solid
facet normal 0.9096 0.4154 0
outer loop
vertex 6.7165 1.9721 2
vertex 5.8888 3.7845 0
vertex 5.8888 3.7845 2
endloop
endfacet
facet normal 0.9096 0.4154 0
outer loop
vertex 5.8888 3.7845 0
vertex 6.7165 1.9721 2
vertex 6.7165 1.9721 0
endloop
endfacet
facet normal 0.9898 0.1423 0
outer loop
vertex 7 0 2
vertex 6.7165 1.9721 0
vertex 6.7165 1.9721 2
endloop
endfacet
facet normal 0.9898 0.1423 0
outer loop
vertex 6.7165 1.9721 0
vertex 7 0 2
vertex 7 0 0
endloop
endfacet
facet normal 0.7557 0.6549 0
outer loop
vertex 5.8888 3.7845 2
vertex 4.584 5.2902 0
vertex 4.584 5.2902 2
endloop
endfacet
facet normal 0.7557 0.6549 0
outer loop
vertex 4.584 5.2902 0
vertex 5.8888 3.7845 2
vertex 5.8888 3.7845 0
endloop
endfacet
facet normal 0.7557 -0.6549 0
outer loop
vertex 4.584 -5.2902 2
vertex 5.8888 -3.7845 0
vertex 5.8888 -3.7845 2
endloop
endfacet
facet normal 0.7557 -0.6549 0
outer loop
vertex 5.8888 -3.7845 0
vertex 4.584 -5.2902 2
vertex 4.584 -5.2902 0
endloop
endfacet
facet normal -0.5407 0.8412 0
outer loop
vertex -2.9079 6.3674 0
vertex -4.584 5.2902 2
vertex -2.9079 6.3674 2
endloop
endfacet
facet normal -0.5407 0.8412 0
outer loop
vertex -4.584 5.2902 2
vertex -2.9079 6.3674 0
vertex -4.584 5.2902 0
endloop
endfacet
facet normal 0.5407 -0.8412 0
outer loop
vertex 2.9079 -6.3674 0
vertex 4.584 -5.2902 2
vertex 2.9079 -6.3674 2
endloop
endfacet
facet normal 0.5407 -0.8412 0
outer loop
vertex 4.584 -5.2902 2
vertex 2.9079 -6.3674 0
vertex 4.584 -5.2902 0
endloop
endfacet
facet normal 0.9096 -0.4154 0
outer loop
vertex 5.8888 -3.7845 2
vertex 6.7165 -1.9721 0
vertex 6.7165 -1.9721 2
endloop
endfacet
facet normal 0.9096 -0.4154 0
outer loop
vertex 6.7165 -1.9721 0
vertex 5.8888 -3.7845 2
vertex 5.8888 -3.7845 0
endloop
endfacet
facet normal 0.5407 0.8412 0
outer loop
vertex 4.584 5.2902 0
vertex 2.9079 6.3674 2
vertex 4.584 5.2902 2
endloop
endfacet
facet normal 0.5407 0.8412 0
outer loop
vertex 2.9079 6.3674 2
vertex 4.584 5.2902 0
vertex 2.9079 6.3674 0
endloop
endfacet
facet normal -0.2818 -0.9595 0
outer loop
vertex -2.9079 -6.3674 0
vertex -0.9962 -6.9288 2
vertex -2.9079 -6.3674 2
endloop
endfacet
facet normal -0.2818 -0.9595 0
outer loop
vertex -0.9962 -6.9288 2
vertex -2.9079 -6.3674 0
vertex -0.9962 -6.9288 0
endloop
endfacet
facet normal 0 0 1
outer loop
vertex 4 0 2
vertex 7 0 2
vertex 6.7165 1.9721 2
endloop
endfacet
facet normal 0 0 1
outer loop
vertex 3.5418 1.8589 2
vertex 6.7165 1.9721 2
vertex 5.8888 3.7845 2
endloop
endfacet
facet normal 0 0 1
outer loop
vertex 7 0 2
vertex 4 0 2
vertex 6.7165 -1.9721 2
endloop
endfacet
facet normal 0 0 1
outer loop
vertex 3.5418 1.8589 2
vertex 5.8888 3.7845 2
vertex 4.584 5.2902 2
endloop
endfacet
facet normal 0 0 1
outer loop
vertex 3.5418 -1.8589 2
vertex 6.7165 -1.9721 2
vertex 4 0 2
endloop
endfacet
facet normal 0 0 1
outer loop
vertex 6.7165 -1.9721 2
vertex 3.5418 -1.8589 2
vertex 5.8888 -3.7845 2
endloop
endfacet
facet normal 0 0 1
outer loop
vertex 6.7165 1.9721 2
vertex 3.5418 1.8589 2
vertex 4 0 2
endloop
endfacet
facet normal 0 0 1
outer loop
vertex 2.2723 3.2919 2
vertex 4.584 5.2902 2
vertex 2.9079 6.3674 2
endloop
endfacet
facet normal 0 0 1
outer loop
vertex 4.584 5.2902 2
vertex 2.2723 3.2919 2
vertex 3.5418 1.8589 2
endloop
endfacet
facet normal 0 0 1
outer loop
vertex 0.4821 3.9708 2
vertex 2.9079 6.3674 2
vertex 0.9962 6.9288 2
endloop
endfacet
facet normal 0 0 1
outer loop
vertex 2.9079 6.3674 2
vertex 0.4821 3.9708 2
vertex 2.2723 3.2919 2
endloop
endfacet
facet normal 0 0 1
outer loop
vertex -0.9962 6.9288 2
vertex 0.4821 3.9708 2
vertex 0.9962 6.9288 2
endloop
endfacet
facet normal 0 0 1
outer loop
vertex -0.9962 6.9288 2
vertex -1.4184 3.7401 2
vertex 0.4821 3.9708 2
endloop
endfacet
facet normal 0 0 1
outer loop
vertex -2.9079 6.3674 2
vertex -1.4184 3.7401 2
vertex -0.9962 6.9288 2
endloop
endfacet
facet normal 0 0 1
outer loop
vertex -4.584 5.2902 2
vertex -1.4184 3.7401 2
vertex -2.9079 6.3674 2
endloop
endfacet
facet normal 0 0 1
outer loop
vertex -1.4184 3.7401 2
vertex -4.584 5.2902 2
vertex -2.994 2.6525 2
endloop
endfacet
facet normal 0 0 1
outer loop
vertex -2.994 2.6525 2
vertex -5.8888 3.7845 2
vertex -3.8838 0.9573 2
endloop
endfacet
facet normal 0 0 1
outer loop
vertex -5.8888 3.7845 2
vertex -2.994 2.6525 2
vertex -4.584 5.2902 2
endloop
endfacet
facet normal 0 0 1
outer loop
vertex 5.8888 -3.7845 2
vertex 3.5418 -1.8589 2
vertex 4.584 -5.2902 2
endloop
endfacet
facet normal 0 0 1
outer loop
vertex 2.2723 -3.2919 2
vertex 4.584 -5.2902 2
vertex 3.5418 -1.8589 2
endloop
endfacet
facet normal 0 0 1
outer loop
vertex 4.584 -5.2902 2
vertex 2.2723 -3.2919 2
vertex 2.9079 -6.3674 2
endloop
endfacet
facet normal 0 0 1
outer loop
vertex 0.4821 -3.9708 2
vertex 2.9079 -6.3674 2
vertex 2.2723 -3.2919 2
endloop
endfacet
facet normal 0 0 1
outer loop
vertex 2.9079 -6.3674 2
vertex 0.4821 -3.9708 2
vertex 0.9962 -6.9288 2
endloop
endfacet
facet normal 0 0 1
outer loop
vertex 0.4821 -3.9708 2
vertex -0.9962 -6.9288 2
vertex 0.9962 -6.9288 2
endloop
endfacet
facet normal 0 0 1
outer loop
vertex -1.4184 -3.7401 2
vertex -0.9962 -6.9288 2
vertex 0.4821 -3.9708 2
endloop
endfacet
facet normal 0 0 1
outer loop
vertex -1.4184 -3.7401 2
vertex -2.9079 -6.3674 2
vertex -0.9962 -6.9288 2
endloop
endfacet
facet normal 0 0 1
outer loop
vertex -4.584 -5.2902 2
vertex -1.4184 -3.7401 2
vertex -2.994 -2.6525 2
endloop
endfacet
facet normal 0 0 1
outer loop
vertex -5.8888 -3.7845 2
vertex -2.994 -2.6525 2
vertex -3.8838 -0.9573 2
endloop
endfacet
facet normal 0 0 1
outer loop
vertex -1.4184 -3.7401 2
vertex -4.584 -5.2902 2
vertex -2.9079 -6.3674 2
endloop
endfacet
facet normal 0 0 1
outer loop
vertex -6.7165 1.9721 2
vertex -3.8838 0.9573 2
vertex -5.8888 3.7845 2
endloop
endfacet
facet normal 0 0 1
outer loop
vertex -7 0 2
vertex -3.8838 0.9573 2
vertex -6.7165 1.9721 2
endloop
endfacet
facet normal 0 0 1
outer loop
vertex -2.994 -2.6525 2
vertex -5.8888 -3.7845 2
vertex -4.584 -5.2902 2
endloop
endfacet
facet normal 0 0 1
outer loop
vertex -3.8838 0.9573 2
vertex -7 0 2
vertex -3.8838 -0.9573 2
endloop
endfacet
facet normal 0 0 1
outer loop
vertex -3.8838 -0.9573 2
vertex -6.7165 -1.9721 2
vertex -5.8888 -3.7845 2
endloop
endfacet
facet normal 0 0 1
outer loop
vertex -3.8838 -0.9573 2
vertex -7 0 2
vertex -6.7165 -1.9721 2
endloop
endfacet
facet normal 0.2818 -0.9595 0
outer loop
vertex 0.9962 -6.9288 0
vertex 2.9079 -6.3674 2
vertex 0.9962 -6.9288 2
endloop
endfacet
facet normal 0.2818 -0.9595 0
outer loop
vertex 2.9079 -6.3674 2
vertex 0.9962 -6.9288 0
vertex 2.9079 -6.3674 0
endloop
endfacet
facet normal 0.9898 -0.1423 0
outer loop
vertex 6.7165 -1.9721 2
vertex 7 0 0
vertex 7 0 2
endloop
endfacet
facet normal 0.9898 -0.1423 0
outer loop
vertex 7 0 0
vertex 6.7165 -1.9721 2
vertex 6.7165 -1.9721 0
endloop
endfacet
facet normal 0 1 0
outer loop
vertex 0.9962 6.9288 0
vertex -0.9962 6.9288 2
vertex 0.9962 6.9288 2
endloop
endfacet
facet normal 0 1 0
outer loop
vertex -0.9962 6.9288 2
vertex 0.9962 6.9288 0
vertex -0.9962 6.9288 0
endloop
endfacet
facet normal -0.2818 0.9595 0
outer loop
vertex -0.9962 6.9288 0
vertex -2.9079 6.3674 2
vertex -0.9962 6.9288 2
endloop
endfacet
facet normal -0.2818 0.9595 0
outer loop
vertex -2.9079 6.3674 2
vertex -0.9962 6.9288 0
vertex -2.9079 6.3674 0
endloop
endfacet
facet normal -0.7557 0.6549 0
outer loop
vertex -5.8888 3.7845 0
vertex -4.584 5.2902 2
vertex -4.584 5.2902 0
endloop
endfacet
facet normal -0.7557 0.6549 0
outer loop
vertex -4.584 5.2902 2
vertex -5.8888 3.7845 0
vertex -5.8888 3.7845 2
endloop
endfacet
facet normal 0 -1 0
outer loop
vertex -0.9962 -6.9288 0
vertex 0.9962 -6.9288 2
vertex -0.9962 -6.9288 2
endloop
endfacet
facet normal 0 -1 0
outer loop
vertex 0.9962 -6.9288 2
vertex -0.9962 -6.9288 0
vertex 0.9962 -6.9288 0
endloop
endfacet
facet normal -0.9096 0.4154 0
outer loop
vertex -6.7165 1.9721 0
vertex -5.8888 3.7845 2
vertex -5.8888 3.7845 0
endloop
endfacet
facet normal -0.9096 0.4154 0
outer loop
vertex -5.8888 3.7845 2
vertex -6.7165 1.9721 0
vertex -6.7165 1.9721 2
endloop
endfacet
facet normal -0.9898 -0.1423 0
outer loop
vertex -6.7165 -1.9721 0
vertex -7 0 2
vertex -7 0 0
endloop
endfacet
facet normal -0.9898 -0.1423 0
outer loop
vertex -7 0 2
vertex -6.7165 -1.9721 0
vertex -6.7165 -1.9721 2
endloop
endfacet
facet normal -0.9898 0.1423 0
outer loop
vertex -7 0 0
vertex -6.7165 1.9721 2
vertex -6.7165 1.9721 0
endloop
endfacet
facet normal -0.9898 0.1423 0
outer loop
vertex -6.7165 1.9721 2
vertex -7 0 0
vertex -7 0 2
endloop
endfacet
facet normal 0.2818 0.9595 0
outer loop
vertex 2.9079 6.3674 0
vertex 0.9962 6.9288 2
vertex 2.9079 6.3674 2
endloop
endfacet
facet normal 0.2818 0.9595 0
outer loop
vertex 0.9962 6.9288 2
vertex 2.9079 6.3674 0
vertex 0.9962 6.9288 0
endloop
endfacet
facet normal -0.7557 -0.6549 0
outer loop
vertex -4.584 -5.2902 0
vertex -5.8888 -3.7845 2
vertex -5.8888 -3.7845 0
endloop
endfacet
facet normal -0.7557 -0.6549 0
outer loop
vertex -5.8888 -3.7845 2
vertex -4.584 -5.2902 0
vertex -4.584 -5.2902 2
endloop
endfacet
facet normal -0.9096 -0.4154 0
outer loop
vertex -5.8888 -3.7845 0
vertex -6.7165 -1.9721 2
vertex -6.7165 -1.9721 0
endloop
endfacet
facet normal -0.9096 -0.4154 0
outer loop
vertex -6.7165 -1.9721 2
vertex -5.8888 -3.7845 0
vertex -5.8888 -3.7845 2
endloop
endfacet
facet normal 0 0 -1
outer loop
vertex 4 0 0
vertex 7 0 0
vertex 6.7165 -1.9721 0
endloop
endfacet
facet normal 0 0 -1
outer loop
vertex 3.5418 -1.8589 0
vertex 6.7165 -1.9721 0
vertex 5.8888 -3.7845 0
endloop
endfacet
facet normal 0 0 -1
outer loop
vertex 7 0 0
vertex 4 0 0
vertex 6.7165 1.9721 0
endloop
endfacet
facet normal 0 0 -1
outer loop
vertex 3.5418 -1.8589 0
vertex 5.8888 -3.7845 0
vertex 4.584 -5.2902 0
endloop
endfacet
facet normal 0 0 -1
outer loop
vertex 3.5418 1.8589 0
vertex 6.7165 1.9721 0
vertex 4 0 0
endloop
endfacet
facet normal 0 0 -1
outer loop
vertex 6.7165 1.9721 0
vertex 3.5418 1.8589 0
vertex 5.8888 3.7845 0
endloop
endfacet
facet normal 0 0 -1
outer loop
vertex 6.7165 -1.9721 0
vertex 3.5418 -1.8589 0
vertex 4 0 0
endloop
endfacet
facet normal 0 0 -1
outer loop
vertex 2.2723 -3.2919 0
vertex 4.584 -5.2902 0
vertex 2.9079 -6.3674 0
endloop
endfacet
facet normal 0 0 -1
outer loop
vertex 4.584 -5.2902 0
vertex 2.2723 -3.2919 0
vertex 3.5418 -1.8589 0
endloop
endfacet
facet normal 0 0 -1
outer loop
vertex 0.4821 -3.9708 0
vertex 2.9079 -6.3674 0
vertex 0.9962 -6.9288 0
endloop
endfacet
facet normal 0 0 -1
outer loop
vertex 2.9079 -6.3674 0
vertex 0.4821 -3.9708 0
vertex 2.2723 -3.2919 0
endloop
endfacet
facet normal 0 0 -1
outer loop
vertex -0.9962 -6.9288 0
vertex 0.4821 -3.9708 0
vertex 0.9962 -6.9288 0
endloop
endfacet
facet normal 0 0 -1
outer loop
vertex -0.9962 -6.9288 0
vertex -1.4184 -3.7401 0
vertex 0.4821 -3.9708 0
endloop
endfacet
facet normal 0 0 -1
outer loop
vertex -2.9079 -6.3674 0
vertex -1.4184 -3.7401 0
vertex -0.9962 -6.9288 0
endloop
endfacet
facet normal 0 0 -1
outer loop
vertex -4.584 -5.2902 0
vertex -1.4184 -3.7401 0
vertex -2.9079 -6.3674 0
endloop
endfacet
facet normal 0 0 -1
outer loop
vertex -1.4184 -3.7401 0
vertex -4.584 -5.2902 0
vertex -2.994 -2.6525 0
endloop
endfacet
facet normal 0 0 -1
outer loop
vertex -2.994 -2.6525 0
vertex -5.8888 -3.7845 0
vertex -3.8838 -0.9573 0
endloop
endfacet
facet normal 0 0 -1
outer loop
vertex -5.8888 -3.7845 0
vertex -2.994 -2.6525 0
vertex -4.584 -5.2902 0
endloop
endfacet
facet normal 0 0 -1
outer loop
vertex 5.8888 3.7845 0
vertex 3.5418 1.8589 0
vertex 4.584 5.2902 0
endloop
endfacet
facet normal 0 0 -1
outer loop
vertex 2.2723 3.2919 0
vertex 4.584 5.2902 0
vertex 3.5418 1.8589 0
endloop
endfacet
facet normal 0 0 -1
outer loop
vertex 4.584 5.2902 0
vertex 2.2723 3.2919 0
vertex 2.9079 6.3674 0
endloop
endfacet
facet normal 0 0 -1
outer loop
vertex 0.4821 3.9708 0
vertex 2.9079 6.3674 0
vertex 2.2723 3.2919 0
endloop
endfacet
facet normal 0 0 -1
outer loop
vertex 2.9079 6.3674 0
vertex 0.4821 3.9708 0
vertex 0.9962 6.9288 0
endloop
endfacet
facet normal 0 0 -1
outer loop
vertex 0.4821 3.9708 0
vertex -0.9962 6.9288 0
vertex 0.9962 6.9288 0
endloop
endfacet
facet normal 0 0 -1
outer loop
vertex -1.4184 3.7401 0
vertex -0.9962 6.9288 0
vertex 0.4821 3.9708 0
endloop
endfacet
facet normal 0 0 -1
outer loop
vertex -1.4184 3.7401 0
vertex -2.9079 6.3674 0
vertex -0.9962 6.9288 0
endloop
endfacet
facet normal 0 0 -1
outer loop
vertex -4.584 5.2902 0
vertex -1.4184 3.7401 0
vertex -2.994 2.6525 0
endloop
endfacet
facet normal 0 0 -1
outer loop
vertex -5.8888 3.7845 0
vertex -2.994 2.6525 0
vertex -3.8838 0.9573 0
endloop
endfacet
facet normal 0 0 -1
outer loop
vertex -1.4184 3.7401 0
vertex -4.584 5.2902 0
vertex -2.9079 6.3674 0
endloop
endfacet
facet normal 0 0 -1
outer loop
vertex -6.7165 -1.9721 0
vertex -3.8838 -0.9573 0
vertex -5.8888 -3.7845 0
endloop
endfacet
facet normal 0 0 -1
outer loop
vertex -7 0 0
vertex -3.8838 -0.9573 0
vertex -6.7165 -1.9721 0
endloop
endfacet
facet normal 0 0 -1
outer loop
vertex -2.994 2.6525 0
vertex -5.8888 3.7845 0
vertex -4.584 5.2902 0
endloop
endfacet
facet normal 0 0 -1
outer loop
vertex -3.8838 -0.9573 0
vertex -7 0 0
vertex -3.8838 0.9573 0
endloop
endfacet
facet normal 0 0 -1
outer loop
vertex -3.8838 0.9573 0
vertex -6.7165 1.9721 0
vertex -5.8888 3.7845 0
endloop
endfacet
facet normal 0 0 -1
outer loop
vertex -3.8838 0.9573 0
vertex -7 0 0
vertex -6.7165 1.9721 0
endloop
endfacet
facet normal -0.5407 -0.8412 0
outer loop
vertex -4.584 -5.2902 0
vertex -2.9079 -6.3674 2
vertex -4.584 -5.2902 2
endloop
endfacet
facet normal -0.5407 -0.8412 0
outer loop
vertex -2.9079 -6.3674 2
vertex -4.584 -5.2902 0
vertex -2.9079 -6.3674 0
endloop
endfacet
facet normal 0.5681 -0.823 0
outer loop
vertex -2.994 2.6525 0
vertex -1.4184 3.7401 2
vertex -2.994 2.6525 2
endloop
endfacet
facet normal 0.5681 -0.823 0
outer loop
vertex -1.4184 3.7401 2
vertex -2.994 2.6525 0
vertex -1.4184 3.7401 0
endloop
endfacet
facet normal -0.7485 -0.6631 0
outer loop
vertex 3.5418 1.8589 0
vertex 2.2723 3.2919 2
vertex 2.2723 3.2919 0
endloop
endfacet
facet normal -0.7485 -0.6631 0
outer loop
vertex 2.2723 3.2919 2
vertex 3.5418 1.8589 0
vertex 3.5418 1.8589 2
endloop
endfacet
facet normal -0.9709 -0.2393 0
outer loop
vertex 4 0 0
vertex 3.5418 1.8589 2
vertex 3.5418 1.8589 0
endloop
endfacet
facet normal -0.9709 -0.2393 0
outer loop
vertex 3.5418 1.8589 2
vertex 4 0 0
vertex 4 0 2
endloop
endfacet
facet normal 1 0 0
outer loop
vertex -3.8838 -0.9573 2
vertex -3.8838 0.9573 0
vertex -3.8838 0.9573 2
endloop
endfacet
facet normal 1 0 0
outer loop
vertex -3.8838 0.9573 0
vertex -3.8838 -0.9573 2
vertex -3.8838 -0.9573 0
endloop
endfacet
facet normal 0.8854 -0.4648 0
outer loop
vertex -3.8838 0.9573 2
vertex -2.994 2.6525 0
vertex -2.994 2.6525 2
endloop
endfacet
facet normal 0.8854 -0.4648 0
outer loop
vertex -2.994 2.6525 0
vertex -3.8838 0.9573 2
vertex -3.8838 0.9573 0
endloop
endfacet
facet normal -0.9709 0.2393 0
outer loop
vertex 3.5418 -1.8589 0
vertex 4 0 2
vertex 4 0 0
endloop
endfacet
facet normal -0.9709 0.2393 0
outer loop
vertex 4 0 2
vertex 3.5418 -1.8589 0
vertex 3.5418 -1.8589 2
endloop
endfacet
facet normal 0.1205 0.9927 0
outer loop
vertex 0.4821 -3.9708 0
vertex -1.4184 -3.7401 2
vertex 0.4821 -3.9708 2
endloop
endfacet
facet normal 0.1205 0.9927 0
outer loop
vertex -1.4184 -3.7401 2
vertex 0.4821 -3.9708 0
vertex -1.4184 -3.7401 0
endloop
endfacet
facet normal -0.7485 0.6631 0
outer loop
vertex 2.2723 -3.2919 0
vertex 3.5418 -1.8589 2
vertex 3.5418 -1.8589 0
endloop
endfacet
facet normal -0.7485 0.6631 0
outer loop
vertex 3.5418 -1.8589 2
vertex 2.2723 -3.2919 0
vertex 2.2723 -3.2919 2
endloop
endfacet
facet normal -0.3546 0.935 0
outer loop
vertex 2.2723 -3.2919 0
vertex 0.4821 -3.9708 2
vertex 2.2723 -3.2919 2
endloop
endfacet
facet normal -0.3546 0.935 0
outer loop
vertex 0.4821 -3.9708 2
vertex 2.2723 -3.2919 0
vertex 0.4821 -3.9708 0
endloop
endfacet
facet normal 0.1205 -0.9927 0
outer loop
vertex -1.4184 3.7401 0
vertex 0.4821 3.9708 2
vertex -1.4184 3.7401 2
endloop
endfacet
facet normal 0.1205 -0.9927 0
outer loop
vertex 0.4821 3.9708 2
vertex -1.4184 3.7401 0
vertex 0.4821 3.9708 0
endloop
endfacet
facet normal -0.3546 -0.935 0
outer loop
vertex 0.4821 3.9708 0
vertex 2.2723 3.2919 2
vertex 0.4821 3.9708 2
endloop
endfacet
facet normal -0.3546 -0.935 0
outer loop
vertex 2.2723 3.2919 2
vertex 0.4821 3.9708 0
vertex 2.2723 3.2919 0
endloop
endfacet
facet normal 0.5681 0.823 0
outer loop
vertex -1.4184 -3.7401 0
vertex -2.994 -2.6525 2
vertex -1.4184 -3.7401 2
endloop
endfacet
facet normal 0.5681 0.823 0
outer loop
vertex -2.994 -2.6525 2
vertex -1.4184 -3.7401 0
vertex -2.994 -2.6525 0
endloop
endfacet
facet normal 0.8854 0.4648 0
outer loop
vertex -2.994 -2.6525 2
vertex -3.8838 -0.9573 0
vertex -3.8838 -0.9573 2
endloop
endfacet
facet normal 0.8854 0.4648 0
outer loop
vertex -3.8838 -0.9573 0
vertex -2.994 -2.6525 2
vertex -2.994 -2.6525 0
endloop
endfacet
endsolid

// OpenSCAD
// part_id: a2
// name: A2 ring
// source_drawing_ids: DRW-001
// units: mm
// revision: 0.1-placeholder
// SPDX-License-Identifier: MIT

module part_a2(od = 14, id = 8, th = 2) {
    difference() {
        cylinder(d = od, h = th, center = false);
        translate([0, 0, -0.1]) cylinder(d = id, h = th + 0.2, center = false);
    }
}


// ---- "main guard" ----
// Default to previewing when opened directly:
if (is_undef(__LIB_MODE__)) {
    part_a2();
}
